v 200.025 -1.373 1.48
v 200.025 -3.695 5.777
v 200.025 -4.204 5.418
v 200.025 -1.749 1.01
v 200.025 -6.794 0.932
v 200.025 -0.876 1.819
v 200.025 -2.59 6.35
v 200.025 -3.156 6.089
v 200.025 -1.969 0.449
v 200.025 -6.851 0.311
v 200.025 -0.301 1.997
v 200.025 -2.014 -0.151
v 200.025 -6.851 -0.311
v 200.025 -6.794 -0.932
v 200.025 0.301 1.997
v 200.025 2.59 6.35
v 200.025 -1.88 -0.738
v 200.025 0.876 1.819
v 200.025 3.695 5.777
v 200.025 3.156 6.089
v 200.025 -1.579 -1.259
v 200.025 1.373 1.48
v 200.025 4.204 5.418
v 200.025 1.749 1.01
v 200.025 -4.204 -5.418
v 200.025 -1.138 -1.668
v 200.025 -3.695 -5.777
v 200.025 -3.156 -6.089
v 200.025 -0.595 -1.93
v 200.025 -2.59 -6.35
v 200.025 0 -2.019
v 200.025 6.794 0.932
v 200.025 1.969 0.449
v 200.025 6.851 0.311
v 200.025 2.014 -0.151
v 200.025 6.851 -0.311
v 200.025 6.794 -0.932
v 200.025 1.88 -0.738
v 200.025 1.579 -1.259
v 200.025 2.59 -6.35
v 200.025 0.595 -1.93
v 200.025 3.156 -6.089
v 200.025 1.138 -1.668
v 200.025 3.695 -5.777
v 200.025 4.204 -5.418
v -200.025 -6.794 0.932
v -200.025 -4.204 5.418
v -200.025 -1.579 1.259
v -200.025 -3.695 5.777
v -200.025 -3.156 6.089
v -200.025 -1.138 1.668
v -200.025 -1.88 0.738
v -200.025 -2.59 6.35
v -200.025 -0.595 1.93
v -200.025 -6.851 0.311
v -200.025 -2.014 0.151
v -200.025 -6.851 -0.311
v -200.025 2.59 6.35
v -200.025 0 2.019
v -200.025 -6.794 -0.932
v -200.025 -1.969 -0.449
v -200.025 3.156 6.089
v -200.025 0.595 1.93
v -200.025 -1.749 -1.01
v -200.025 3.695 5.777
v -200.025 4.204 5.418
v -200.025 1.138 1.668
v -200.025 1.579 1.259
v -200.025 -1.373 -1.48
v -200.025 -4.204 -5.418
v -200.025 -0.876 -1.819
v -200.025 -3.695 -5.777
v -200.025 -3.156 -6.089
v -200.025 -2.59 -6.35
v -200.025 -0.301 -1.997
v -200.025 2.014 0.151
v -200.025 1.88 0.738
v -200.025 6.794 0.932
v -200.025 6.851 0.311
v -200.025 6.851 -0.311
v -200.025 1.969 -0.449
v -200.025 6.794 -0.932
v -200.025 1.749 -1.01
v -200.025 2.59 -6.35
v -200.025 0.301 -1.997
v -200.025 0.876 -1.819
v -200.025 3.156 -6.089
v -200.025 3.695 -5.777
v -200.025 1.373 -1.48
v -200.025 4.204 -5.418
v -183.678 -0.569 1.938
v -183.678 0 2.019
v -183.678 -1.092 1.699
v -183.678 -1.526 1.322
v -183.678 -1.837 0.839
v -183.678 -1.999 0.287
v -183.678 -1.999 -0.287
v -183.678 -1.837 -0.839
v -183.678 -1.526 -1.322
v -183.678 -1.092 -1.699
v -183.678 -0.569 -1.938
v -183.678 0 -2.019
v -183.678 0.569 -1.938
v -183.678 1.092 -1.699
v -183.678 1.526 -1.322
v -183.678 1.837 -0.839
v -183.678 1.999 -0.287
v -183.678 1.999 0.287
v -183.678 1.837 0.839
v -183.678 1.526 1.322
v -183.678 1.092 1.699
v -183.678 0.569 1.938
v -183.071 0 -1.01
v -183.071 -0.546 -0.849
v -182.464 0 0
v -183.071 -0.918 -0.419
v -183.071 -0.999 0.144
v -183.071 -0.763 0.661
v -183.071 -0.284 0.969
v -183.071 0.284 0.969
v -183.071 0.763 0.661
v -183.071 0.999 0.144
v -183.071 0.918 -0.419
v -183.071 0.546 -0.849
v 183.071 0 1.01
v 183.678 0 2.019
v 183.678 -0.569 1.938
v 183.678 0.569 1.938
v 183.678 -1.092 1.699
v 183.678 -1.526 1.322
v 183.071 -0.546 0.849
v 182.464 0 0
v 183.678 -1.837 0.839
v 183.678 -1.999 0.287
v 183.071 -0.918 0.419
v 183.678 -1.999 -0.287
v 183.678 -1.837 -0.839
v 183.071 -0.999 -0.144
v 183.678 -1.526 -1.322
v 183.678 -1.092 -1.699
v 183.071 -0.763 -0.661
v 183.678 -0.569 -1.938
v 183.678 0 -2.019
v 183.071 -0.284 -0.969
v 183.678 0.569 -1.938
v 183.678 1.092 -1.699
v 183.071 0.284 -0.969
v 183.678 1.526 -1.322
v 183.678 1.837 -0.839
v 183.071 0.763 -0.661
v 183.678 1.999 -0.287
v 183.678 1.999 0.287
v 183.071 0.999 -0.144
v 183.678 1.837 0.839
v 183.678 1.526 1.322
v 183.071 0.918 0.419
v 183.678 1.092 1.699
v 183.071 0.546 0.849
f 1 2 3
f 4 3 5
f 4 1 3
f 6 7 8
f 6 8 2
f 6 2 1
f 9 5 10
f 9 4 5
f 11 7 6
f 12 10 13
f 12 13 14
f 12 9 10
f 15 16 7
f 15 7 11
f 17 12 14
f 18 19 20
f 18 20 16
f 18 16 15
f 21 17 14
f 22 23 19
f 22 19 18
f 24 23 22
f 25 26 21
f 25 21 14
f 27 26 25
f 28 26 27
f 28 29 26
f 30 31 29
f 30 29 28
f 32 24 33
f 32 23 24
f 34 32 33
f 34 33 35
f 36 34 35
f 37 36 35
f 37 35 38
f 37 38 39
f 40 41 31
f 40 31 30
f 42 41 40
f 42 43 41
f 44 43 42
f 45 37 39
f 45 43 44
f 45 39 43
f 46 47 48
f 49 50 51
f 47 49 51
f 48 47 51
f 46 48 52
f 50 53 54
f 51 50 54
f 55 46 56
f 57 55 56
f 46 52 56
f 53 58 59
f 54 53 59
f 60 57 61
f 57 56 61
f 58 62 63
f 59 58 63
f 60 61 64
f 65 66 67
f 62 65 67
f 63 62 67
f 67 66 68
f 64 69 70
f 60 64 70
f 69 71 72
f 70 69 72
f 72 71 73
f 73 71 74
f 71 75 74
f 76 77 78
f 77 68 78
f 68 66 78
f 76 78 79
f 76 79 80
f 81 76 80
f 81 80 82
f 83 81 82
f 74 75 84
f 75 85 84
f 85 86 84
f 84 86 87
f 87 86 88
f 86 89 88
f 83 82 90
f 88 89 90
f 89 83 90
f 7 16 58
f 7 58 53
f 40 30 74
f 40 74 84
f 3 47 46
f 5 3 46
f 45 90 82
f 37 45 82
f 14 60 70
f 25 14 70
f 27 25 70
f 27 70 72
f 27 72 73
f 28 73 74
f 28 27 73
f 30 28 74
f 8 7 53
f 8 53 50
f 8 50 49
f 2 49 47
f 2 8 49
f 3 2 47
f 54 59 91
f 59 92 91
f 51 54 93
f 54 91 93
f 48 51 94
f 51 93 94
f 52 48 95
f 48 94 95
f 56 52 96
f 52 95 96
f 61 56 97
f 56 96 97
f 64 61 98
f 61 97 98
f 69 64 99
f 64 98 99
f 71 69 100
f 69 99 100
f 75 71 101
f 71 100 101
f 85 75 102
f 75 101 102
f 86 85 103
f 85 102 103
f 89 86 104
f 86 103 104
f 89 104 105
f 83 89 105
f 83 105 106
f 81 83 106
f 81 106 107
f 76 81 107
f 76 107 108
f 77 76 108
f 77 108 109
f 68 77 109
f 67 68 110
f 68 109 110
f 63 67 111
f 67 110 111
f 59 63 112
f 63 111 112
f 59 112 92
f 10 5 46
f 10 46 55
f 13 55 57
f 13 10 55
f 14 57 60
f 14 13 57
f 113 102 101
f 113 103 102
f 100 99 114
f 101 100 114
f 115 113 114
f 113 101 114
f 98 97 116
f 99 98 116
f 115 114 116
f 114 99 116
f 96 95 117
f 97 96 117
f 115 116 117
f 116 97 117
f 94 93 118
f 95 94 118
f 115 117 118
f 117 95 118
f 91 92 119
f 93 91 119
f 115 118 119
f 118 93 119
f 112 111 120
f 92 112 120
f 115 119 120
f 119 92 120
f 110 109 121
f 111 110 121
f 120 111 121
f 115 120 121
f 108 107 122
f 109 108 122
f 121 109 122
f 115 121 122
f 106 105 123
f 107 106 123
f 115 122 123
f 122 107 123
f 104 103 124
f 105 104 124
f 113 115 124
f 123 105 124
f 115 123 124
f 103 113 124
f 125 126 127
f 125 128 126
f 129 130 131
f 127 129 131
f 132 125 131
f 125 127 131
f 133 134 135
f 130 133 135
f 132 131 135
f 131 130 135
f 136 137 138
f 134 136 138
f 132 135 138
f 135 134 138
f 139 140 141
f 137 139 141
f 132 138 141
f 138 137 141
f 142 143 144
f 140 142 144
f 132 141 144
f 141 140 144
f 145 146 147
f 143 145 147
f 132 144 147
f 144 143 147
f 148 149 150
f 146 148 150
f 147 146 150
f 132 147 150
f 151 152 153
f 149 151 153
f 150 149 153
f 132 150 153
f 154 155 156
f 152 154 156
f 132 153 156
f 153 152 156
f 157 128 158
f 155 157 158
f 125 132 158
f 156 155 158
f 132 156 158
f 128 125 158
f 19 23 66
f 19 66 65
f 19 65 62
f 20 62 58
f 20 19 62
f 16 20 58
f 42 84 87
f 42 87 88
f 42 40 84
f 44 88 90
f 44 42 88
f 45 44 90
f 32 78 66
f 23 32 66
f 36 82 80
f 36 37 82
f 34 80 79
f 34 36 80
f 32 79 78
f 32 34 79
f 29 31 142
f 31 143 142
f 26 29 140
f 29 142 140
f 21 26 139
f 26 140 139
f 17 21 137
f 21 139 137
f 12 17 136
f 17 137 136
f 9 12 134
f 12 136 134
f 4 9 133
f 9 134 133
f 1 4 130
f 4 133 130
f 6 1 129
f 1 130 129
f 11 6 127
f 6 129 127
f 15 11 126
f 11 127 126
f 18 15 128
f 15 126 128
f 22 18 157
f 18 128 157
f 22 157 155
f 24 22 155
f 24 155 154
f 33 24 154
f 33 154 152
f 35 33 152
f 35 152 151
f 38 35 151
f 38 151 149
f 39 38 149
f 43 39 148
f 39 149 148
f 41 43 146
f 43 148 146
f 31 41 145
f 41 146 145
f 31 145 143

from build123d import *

# Parameters (mm, degrees)
BOSS_EXTRUDE1_DEPTH                  = 200.025
F_10_32_TAPPED_HOLE1_D               = 4.0386
F_10_32_TAPPED_HOLE1_DEPTH           = 16.34744
F_10_32_TAPPED_HOLE1_TIP             = 1.213317848
F_10_32_TAPPED_HOLE1_ON_FACE_2_D     = 4.0386
F_10_32_TAPPED_HOLE1_ON_FACE_2_DEPTH = 16.34744
F_10_32_TAPPED_HOLE1_ON_FACE_2_TIP   = 1.213317848


with BuildPart() as part:
    # Sketch1 → Boss-Extrude1 (new, symmetric)
    with BuildSketch(Plane(origin=(0, 0, 0), x_dir=(0, 0, -1), z_dir=(1, 0, 0))):
        with BuildLine():
            ThreePointArc((0.93173274, 6.79441227), (0, 6.858), (-0.93173274, 6.79441227))
            Line((-0.93173274, 6.79441227), (-5.41826726, 4.204110358))
            ThreePointArc((-5.41826726, 4.204110358), (-5.939202219, 3.429), (-6.35, 2.590301913))
            Line((-6.35, 2.590301913), (-6.35, -2.590301913))
            ThreePointArc((-6.35, -2.590301913), (-5.939202219, -3.429), (-5.41826726, -4.204110358))
            Line((-5.41826726, -4.204110358), (-0.93173274, -6.79441227))
            ThreePointArc((-0.93173274, -6.79441227), (0, -6.858), (0.93173274, -6.79441227))
            Line((0.93173274, -6.79441227), (5.41826726, -4.204110358))
            ThreePointArc((5.41826726, -4.204110358), (5.939202219, -3.429), (6.35, -2.590301913))
            Line((6.35, -2.590301913), (6.35, 2.590301913))
            ThreePointArc((6.35, 2.590301913), (5.939202219, 3.429), (5.41826726, 4.204110358))
            Line((5.41826726, 4.204110358), (0.93173274, 6.79441227))
        make_face()
    extrude(amount=BOSS_EXTRUDE1_DEPTH, both=True)

    # #10-32 Tapped Hole1
    with Locations(Plane(origin=(-200.025, 0, 0), x_dir=(0, 0, -1), z_dir=(-1, 0, 0))):
        with Locations((0, 0)):
            Hole(F_10_32_TAPPED_HOLE1_D / 2, depth=F_10_32_TAPPED_HOLE1_DEPTH)
            with Locations((0, 0, -(F_10_32_TAPPED_HOLE1_DEPTH + F_10_32_TAPPED_HOLE1_TIP / 2))):  # 118° drill point
                Cone(0, F_10_32_TAPPED_HOLE1_D / 2, F_10_32_TAPPED_HOLE1_TIP, mode=Mode.SUBTRACT)

    # #10-32 Tapped Hole1 on face 2
    with Locations(Plane(origin=(200.025, 0, 0), x_dir=(0, 0, 1), z_dir=(1, 0, 0))):
        with Locations((0, 0)):
            Hole(F_10_32_TAPPED_HOLE1_ON_FACE_2_D / 2, depth=F_10_32_TAPPED_HOLE1_ON_FACE_2_DEPTH)
            with Locations((0, 0, -(F_10_32_TAPPED_HOLE1_ON_FACE_2_DEPTH + F_10_32_TAPPED_HOLE1_ON_FACE_2_TIP / 2))):  # 118° drill point
                Cone(0, F_10_32_TAPPED_HOLE1_ON_FACE_2_D / 2, F_10_32_TAPPED_HOLE1_ON_FACE_2_TIP, mode=Mode.SUBTRACT)


solid = part.part
